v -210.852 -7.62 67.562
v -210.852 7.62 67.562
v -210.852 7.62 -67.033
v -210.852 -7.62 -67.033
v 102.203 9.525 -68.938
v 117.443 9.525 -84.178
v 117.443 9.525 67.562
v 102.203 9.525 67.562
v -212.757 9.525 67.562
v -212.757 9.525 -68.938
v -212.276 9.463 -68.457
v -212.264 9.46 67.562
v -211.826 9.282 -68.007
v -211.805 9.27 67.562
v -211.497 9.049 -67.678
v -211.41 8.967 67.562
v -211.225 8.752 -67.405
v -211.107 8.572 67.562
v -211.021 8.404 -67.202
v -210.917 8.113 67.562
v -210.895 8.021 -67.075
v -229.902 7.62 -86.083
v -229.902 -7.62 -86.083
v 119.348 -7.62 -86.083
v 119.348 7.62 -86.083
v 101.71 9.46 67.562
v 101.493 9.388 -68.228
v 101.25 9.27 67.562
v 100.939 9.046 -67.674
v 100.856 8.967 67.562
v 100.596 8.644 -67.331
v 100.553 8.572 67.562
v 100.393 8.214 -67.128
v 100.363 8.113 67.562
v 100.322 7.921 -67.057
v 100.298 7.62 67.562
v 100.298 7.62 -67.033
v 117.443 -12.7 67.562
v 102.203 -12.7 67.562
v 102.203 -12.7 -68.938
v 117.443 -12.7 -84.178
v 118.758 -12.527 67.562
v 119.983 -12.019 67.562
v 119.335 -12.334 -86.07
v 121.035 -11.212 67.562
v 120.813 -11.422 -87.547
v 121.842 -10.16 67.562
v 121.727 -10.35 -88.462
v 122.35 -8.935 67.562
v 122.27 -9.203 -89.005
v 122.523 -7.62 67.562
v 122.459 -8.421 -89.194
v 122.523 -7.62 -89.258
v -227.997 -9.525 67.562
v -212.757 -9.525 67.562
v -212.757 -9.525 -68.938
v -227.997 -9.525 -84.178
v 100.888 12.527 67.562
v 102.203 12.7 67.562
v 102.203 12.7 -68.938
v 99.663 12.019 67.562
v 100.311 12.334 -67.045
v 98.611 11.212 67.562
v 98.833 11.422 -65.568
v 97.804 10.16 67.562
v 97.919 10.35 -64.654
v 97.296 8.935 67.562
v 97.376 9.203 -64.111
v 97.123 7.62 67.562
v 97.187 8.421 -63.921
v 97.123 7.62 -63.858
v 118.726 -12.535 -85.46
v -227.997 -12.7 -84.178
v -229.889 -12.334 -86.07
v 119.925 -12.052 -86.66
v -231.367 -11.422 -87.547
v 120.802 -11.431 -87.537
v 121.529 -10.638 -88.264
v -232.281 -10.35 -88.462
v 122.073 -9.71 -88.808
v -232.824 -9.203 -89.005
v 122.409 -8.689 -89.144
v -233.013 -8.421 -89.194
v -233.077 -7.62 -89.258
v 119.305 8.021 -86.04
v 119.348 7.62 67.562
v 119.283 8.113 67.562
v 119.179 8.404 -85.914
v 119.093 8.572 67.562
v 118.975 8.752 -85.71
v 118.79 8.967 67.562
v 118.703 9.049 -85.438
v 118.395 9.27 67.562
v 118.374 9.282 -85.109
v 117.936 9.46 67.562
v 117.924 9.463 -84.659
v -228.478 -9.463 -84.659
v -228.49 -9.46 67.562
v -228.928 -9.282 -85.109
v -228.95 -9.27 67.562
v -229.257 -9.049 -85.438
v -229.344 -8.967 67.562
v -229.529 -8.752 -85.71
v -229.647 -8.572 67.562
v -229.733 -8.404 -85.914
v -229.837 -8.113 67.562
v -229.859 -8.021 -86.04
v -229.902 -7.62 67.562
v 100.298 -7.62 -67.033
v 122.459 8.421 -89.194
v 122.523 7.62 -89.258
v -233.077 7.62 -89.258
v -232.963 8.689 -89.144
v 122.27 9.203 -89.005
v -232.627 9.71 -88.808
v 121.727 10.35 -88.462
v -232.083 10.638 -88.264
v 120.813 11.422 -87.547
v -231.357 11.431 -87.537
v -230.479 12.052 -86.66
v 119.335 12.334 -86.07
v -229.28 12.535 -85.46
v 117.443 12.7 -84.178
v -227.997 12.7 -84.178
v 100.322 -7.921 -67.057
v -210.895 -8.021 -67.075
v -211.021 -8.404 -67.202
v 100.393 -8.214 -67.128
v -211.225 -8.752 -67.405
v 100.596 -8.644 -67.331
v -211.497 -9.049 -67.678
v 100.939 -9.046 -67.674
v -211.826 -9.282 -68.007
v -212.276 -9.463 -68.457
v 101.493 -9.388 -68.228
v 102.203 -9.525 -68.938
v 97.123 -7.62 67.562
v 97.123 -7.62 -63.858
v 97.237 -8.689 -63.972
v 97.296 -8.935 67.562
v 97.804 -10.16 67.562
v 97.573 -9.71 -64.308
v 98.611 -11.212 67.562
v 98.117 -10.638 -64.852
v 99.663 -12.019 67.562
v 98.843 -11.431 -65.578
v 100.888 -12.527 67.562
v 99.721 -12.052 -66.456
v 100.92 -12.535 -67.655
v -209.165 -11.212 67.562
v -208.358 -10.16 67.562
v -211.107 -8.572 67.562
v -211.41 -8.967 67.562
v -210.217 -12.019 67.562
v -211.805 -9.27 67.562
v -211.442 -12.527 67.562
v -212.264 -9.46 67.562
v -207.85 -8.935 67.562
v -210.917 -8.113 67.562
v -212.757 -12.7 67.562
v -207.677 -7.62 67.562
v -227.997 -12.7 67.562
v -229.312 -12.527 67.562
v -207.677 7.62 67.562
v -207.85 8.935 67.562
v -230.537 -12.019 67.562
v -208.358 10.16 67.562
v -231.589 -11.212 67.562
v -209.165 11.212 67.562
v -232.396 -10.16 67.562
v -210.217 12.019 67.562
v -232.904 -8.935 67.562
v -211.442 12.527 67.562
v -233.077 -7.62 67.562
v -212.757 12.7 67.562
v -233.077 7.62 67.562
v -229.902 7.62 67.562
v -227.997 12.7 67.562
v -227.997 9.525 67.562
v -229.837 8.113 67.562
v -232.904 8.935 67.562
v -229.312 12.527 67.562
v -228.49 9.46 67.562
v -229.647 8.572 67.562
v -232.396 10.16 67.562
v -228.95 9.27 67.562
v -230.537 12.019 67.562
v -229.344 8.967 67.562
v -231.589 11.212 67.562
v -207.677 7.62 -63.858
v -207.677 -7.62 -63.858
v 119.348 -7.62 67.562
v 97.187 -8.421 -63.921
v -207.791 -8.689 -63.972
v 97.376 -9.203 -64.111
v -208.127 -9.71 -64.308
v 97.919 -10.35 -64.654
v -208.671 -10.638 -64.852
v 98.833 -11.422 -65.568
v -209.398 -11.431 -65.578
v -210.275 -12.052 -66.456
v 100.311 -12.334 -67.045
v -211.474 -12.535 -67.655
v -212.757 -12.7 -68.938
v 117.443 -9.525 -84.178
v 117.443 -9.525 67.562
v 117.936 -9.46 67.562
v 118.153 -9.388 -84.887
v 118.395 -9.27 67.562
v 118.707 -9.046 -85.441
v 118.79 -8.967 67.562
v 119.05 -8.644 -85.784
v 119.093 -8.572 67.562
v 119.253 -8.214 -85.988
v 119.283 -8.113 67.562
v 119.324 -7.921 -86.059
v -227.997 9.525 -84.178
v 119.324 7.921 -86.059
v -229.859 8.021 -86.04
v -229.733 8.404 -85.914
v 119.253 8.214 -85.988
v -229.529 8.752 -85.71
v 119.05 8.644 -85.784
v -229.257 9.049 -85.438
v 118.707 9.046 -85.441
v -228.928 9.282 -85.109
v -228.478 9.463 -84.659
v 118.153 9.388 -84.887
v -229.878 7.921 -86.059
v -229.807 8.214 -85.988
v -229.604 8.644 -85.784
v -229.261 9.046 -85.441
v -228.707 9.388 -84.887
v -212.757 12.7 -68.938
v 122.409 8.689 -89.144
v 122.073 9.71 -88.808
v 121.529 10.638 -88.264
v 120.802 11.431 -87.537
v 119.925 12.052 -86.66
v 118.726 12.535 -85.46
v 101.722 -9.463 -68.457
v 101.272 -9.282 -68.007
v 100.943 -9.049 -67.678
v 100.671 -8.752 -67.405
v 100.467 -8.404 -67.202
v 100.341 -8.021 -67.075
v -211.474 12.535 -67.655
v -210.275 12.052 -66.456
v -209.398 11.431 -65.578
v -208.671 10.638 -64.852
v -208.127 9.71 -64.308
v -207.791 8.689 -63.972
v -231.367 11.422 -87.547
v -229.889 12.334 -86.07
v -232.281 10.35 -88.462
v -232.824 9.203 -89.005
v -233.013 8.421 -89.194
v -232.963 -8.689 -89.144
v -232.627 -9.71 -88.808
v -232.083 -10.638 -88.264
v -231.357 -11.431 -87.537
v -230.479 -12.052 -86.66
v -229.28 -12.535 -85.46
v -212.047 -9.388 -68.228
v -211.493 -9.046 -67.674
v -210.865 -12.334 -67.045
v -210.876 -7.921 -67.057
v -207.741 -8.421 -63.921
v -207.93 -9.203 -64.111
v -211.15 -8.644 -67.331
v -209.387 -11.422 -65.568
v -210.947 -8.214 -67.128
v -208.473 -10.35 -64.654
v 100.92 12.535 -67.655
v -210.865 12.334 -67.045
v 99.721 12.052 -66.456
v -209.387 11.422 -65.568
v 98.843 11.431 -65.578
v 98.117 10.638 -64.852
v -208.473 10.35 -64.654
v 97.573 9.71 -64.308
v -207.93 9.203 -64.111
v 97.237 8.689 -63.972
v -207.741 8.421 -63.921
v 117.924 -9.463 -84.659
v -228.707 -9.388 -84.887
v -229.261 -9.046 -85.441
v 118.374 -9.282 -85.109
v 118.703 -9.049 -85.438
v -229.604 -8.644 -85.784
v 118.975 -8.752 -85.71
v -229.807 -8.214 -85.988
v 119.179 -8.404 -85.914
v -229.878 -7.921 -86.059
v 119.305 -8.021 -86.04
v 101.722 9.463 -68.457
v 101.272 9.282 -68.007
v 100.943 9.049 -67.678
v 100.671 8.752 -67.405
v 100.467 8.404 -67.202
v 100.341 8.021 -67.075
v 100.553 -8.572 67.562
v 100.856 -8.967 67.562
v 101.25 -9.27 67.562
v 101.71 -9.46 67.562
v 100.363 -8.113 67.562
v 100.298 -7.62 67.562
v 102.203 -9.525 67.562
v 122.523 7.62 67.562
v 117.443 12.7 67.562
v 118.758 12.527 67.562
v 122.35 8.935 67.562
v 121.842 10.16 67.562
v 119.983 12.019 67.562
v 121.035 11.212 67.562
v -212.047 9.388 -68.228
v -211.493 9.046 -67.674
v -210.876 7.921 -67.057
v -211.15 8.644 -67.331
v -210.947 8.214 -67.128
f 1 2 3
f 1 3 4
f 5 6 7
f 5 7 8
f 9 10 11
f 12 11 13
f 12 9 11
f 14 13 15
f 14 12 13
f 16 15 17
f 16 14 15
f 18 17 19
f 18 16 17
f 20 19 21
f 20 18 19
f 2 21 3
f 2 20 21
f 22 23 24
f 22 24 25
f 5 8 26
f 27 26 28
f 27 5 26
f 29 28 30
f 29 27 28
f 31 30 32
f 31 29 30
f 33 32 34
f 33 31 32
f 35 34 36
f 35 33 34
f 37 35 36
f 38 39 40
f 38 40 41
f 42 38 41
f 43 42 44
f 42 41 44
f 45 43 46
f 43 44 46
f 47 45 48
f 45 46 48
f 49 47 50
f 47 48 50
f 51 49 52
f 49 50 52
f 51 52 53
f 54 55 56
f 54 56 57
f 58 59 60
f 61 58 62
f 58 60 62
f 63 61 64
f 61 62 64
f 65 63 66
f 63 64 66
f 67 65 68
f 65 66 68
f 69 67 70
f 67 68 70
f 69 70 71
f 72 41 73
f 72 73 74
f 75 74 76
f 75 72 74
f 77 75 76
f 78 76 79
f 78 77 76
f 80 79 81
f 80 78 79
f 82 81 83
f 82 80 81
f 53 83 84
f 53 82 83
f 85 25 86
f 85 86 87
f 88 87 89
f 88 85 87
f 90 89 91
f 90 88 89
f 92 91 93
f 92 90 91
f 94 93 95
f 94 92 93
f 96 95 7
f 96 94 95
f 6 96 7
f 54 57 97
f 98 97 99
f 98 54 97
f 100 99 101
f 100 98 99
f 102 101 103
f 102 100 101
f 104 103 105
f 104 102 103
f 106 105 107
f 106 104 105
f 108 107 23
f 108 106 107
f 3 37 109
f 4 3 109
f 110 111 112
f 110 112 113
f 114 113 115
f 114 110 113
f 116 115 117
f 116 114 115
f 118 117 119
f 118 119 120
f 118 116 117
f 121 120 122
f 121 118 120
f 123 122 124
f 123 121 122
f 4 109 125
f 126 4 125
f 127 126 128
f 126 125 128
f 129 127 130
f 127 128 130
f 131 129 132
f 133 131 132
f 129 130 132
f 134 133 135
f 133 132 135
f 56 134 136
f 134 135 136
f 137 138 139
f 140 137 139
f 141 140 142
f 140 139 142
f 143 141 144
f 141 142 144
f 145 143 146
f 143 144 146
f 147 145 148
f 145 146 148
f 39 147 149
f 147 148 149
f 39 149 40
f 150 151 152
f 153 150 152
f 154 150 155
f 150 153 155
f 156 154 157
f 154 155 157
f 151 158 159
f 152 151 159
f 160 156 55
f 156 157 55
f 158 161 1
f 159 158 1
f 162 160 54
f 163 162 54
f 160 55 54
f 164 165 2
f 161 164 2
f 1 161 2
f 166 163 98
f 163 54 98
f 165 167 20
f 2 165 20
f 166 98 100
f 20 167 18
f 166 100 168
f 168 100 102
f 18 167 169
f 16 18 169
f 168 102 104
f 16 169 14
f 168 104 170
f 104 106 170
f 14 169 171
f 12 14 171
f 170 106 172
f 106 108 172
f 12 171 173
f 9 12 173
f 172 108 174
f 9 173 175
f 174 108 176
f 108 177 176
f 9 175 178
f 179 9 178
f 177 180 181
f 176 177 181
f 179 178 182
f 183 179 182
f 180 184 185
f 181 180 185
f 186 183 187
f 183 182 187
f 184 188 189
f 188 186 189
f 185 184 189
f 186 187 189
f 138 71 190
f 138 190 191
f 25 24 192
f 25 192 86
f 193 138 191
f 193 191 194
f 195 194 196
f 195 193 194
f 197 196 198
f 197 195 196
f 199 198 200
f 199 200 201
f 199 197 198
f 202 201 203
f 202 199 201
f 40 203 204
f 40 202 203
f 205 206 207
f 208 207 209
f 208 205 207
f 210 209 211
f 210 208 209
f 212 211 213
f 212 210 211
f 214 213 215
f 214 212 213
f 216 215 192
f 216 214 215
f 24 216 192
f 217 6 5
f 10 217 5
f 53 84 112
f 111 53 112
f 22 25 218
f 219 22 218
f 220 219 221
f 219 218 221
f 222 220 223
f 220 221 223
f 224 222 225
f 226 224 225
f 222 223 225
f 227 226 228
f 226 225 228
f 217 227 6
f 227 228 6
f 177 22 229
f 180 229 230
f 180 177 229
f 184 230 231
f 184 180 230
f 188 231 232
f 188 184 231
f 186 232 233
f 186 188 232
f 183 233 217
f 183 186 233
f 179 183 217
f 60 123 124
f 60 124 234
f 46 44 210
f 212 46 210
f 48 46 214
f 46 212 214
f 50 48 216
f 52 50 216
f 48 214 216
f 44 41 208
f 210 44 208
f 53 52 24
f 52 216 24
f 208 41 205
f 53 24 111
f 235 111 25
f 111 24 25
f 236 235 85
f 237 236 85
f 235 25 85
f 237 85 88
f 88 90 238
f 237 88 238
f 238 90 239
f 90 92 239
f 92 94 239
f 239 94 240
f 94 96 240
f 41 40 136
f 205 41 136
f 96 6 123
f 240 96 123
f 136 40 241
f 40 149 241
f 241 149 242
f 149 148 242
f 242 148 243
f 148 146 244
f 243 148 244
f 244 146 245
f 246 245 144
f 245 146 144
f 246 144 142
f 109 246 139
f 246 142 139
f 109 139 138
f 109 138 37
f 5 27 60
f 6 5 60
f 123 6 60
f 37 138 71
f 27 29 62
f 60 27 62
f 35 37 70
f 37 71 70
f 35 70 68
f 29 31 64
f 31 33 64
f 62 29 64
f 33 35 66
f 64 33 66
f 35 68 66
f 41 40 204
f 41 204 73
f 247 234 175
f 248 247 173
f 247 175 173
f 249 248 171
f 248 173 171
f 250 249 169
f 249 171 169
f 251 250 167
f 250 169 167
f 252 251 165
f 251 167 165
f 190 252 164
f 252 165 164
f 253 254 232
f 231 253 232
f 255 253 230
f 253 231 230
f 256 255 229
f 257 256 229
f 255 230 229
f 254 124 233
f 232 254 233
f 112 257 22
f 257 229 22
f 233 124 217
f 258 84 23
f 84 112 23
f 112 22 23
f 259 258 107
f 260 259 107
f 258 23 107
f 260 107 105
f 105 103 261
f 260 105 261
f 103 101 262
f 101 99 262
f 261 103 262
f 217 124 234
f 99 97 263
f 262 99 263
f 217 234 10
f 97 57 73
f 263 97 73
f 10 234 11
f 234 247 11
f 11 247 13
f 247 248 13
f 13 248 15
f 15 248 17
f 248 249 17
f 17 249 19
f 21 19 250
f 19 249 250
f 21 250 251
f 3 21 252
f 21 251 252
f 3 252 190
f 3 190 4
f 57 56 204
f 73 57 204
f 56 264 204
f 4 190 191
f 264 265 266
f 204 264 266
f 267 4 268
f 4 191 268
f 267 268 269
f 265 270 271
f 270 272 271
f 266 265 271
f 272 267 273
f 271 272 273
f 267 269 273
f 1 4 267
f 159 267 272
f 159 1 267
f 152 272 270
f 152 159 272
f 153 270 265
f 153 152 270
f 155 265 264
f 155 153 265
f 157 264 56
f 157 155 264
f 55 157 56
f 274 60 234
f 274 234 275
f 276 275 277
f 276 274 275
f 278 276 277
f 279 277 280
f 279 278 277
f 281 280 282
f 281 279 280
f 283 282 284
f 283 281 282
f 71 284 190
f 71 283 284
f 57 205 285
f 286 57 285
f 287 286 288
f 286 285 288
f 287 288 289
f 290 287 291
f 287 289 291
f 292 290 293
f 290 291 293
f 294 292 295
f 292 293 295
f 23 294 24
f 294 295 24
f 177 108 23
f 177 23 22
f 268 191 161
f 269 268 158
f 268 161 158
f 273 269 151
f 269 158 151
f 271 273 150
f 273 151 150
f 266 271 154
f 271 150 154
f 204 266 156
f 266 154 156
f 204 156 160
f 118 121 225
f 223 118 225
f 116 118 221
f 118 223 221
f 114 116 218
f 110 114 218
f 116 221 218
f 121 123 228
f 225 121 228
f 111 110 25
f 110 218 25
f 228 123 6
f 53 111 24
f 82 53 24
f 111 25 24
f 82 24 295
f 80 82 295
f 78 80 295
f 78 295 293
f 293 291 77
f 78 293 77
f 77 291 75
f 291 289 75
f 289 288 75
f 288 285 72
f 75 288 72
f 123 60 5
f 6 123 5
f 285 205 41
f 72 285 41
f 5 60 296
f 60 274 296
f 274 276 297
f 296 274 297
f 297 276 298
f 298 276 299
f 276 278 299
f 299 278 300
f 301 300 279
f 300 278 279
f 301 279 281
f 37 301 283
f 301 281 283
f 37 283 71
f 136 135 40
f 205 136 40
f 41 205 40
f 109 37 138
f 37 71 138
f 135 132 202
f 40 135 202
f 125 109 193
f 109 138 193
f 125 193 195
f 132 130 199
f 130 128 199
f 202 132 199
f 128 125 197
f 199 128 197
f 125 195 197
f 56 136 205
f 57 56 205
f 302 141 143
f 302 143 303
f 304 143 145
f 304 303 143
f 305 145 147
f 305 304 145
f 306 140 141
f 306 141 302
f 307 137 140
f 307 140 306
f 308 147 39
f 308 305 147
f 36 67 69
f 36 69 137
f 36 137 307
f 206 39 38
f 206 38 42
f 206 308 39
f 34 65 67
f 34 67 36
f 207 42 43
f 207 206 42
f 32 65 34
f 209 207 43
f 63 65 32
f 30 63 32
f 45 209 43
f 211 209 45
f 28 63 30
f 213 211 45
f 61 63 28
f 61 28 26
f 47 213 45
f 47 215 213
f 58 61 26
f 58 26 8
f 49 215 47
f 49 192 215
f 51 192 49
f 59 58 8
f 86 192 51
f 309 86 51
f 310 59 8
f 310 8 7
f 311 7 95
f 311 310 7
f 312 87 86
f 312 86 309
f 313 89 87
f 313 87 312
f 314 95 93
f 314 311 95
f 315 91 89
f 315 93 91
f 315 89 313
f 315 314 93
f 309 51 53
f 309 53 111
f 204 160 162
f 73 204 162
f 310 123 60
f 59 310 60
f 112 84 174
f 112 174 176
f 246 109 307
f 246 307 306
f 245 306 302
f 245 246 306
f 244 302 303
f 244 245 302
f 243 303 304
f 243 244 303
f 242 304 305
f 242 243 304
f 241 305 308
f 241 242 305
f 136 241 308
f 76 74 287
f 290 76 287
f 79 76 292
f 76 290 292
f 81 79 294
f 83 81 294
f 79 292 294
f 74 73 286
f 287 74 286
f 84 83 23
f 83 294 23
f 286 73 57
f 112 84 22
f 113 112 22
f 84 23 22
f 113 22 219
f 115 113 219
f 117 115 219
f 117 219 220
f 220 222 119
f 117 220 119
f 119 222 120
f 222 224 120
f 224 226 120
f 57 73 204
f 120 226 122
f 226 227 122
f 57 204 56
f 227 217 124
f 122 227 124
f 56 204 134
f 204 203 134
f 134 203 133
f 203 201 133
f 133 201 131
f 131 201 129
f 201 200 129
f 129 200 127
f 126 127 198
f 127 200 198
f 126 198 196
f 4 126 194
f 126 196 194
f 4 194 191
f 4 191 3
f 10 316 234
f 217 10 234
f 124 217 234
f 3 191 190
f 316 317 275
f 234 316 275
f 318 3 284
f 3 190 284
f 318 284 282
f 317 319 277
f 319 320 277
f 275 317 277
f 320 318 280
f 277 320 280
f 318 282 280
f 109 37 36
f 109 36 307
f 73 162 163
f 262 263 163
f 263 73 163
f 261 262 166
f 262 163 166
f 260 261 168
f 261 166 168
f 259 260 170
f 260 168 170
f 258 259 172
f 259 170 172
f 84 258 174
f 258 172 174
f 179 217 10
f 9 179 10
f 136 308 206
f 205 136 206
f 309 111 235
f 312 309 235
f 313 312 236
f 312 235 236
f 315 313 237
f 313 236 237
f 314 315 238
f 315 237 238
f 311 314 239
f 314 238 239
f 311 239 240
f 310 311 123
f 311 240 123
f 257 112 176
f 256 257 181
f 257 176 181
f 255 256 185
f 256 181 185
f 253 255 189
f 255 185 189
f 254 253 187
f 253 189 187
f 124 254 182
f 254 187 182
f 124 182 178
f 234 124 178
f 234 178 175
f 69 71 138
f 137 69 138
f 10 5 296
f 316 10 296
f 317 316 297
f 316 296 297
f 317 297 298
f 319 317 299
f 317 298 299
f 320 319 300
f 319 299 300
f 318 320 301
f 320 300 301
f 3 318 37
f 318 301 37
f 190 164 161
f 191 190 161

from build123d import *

# Parameters (mm, degrees)
SQUARE_TUBING_1_X_1_X_0_125_1_DEPTH        = 163.080112242
SQUARE_TUBING_1_X_1_X_0_125_1_2_DEPTH      = 349.160512242
SQUARE_TUBING_1_X_1_X_0_125_1_2_DEPTH_BACK = 18.960512242
SQUARE_TUBING_1_X_1_X_0_125_1_3_DEPTH      = 163.080112242


with BuildPart() as part:
    # Sketch12 on segment 1 (carried to segment 1) → Square tubing 1 X 1 X 0.125(1) (new body)
    with BuildSketch(Plane(origin=(-220.377072335, 0, 67.561808122), x_dir=(-1, 0, 0), z_dir=(0, 0, -1))):
        with BuildLine():
            Line((-7.62, -12.7), (7.62, -12.7))
            ThreePointArc((7.62, -12.7), (11.212102448, -11.212102448), (12.7, -7.62))
            Line((12.7, -7.62), (12.7, 7.62))
            ThreePointArc((12.7, 7.62), (11.212102448, 11.212102448), (7.62, 12.7))
            Line((7.62, 12.7), (-7.62, 12.7))
            ThreePointArc((-7.62, 12.7), (-11.212102448, 11.212102448), (-12.7, 7.62))
            Line((-12.7, 7.62), (-12.7, -7.62))
            ThreePointArc((-12.7, -7.62), (-11.212102448, -11.212102448), (-7.62, -12.7))
        make_face()
        with BuildLine():
            Line((-7.62, -9.525), (7.62, -9.525))
            ThreePointArc((7.62, -9.525), (8.967038418, -8.967038418), (9.525, -7.62))
            Line((9.525, -7.62), (9.525, 7.62))
            ThreePointArc((9.525, 7.62), (8.967038418, 8.967038418), (7.62, 9.525))
            Line((7.62, 9.525), (-7.62, 9.525))
            ThreePointArc((-7.62, 9.525), (-8.967038418, 8.967038418), (-9.525, 7.62))
            Line((-9.525, 7.62), (-9.525, -7.62))
            ThreePointArc((-9.525, -7.62), (-8.967038418, -8.967038418), (-7.62, -9.525))
        make_face(mode=Mode.SUBTRACT)
    extrude(amount=SQUARE_TUBING_1_X_1_X_0_125_1_DEPTH)

    # Square tubing 1 X 1 X 0.125(1) mitre 1
    split(bisect_by=Plane(origin=(-220.377072335, 0, -76.557791878), x_dir=(0, -1, 0), z_dir=(-0.707106781, 0, 0.707106781)), keep=Keep.TOP)


with BuildPart() as body_2:
    # Sketch12 → Square tubing 1 X 1 X 0.125_1 2 (new, two sides)
    with BuildSketch(Plane(origin=(-220.377072335, 0, -76.557791878), x_dir=(0, 0, -1), z_dir=(1, 0, 0))) as square_tubing_1_x_1_x_0_125_1_2_sk:
        with BuildLine():
            Line((-7.62, -12.7), (7.62, -12.7))
            ThreePointArc((7.62, -12.7), (11.212102448, -11.212102448), (12.7, -7.62))
            Line((12.7, -7.62), (12.7, 7.62))
            ThreePointArc((12.7, 7.62), (11.212102448, 11.212102448), (7.62, 12.7))
            Line((7.62, 12.7), (-7.62, 12.7))
            ThreePointArc((-7.62, 12.7), (-11.212102448, 11.212102448), (-12.7, 7.62))
            Line((-12.7, 7.62), (-12.7, -7.62))
            ThreePointArc((-12.7, -7.62), (-11.212102448, -11.212102448), (-7.62, -12.7))
        make_face()
        with BuildLine():
            Line((-7.62, -9.525), (7.62, -9.525))
            ThreePointArc((7.62, -9.525), (8.967038418, -8.967038418), (9.525, -7.62))
            Line((9.525, -7.62), (9.525, 7.62))
            ThreePointArc((9.525, 7.62), (8.967038418, 8.967038418), (7.62, 9.525))
            Line((7.62, 9.525), (-7.62, 9.525))
            ThreePointArc((-7.62, 9.525), (-8.967038418, 8.967038418), (-9.525, 7.62))
            Line((-9.525, 7.62), (-9.525, -7.62))
            ThreePointArc((-9.525, -7.62), (-8.967038418, -8.967038418), (-7.62, -9.525))
        make_face(mode=Mode.SUBTRACT)
    extrude(amount=SQUARE_TUBING_1_X_1_X_0_125_1_2_DEPTH)
    extrude(square_tubing_1_x_1_x_0_125_1_2_sk.sketch, amount=-SQUARE_TUBING_1_X_1_X_0_125_1_2_DEPTH_BACK)

    # Square tubing 1 X 1 X 0.125_1 2 mitre 1
    split(bisect_by=Plane(origin=(-220.377072335, 0, -76.557791878), x_dir=(0, 1, 0), z_dir=(0.707106781, 0, -0.707106781)), keep=Keep.TOP)

    # Square tubing 1 X 1 X 0.125_1 2 mitre 2
    split(bisect_by=Plane(origin=(109.822927665, 0, -76.557791878), x_dir=(0, -1, 0), z_dir=(-0.707106781, 0, -0.707106781)), keep=Keep.TOP)


with BuildPart() as body_3:
    # Sketch12 on segment 3 (carried to segment 3) → Square tubing 1 X 1 X 0.125_1 3 (new body)
    with BuildSketch(Plane(origin=(109.822927665, 0, -95.51830412), x_dir=(1, 0, 0), z_dir=(0, 0, 1))):
        with BuildLine():
            Line((-7.62, -12.7), (7.62, -12.7))
            ThreePointArc((7.62, -12.7), (11.212102448, -11.212102448), (12.7, -7.62))
            Line((12.7, -7.62), (12.7, 7.62))
            ThreePointArc((12.7, 7.62), (11.212102448, 11.212102448), (7.62, 12.7))
            Line((7.62, 12.7), (-7.62, 12.7))
            ThreePointArc((-7.62, 12.7), (-11.212102448, 11.212102448), (-12.7, 7.62))
            Line((-12.7, 7.62), (-12.7, -7.62))
            ThreePointArc((-12.7, -7.62), (-11.212102448, -11.212102448), (-7.62, -12.7))
        make_face()
        with BuildLine():
            Line((-7.62, -9.525), (7.62, -9.525))
            ThreePointArc((7.62, -9.525), (8.967038418, -8.967038418), (9.525, -7.62))
            Line((9.525, -7.62), (9.525, 7.62))
            ThreePointArc((9.525, 7.62), (8.967038418, 8.967038418), (7.62, 9.525))
            Line((7.62, 9.525), (-7.62, 9.525))
            ThreePointArc((-7.62, 9.525), (-8.967038418, 8.967038418), (-9.525, 7.62))
            Line((-9.525, 7.62), (-9.525, -7.62))
            ThreePointArc((-9.525, -7.62), (-8.967038418, -8.967038418), (-7.62, -9.525))
        make_face(mode=Mode.SUBTRACT)
    extrude(amount=SQUARE_TUBING_1_X_1_X_0_125_1_3_DEPTH)

    # Square tubing 1 X 1 X 0.125_1 3 mitre 1
    split(bisect_by=Plane(origin=(109.822927665, 0, -76.557791878), x_dir=(0, 1, 0), z_dir=(0.707106781, 0, 0.707106781)), keep=Keep.TOP)


solid = Compound([part.part, body_2.part, body_3.part])
